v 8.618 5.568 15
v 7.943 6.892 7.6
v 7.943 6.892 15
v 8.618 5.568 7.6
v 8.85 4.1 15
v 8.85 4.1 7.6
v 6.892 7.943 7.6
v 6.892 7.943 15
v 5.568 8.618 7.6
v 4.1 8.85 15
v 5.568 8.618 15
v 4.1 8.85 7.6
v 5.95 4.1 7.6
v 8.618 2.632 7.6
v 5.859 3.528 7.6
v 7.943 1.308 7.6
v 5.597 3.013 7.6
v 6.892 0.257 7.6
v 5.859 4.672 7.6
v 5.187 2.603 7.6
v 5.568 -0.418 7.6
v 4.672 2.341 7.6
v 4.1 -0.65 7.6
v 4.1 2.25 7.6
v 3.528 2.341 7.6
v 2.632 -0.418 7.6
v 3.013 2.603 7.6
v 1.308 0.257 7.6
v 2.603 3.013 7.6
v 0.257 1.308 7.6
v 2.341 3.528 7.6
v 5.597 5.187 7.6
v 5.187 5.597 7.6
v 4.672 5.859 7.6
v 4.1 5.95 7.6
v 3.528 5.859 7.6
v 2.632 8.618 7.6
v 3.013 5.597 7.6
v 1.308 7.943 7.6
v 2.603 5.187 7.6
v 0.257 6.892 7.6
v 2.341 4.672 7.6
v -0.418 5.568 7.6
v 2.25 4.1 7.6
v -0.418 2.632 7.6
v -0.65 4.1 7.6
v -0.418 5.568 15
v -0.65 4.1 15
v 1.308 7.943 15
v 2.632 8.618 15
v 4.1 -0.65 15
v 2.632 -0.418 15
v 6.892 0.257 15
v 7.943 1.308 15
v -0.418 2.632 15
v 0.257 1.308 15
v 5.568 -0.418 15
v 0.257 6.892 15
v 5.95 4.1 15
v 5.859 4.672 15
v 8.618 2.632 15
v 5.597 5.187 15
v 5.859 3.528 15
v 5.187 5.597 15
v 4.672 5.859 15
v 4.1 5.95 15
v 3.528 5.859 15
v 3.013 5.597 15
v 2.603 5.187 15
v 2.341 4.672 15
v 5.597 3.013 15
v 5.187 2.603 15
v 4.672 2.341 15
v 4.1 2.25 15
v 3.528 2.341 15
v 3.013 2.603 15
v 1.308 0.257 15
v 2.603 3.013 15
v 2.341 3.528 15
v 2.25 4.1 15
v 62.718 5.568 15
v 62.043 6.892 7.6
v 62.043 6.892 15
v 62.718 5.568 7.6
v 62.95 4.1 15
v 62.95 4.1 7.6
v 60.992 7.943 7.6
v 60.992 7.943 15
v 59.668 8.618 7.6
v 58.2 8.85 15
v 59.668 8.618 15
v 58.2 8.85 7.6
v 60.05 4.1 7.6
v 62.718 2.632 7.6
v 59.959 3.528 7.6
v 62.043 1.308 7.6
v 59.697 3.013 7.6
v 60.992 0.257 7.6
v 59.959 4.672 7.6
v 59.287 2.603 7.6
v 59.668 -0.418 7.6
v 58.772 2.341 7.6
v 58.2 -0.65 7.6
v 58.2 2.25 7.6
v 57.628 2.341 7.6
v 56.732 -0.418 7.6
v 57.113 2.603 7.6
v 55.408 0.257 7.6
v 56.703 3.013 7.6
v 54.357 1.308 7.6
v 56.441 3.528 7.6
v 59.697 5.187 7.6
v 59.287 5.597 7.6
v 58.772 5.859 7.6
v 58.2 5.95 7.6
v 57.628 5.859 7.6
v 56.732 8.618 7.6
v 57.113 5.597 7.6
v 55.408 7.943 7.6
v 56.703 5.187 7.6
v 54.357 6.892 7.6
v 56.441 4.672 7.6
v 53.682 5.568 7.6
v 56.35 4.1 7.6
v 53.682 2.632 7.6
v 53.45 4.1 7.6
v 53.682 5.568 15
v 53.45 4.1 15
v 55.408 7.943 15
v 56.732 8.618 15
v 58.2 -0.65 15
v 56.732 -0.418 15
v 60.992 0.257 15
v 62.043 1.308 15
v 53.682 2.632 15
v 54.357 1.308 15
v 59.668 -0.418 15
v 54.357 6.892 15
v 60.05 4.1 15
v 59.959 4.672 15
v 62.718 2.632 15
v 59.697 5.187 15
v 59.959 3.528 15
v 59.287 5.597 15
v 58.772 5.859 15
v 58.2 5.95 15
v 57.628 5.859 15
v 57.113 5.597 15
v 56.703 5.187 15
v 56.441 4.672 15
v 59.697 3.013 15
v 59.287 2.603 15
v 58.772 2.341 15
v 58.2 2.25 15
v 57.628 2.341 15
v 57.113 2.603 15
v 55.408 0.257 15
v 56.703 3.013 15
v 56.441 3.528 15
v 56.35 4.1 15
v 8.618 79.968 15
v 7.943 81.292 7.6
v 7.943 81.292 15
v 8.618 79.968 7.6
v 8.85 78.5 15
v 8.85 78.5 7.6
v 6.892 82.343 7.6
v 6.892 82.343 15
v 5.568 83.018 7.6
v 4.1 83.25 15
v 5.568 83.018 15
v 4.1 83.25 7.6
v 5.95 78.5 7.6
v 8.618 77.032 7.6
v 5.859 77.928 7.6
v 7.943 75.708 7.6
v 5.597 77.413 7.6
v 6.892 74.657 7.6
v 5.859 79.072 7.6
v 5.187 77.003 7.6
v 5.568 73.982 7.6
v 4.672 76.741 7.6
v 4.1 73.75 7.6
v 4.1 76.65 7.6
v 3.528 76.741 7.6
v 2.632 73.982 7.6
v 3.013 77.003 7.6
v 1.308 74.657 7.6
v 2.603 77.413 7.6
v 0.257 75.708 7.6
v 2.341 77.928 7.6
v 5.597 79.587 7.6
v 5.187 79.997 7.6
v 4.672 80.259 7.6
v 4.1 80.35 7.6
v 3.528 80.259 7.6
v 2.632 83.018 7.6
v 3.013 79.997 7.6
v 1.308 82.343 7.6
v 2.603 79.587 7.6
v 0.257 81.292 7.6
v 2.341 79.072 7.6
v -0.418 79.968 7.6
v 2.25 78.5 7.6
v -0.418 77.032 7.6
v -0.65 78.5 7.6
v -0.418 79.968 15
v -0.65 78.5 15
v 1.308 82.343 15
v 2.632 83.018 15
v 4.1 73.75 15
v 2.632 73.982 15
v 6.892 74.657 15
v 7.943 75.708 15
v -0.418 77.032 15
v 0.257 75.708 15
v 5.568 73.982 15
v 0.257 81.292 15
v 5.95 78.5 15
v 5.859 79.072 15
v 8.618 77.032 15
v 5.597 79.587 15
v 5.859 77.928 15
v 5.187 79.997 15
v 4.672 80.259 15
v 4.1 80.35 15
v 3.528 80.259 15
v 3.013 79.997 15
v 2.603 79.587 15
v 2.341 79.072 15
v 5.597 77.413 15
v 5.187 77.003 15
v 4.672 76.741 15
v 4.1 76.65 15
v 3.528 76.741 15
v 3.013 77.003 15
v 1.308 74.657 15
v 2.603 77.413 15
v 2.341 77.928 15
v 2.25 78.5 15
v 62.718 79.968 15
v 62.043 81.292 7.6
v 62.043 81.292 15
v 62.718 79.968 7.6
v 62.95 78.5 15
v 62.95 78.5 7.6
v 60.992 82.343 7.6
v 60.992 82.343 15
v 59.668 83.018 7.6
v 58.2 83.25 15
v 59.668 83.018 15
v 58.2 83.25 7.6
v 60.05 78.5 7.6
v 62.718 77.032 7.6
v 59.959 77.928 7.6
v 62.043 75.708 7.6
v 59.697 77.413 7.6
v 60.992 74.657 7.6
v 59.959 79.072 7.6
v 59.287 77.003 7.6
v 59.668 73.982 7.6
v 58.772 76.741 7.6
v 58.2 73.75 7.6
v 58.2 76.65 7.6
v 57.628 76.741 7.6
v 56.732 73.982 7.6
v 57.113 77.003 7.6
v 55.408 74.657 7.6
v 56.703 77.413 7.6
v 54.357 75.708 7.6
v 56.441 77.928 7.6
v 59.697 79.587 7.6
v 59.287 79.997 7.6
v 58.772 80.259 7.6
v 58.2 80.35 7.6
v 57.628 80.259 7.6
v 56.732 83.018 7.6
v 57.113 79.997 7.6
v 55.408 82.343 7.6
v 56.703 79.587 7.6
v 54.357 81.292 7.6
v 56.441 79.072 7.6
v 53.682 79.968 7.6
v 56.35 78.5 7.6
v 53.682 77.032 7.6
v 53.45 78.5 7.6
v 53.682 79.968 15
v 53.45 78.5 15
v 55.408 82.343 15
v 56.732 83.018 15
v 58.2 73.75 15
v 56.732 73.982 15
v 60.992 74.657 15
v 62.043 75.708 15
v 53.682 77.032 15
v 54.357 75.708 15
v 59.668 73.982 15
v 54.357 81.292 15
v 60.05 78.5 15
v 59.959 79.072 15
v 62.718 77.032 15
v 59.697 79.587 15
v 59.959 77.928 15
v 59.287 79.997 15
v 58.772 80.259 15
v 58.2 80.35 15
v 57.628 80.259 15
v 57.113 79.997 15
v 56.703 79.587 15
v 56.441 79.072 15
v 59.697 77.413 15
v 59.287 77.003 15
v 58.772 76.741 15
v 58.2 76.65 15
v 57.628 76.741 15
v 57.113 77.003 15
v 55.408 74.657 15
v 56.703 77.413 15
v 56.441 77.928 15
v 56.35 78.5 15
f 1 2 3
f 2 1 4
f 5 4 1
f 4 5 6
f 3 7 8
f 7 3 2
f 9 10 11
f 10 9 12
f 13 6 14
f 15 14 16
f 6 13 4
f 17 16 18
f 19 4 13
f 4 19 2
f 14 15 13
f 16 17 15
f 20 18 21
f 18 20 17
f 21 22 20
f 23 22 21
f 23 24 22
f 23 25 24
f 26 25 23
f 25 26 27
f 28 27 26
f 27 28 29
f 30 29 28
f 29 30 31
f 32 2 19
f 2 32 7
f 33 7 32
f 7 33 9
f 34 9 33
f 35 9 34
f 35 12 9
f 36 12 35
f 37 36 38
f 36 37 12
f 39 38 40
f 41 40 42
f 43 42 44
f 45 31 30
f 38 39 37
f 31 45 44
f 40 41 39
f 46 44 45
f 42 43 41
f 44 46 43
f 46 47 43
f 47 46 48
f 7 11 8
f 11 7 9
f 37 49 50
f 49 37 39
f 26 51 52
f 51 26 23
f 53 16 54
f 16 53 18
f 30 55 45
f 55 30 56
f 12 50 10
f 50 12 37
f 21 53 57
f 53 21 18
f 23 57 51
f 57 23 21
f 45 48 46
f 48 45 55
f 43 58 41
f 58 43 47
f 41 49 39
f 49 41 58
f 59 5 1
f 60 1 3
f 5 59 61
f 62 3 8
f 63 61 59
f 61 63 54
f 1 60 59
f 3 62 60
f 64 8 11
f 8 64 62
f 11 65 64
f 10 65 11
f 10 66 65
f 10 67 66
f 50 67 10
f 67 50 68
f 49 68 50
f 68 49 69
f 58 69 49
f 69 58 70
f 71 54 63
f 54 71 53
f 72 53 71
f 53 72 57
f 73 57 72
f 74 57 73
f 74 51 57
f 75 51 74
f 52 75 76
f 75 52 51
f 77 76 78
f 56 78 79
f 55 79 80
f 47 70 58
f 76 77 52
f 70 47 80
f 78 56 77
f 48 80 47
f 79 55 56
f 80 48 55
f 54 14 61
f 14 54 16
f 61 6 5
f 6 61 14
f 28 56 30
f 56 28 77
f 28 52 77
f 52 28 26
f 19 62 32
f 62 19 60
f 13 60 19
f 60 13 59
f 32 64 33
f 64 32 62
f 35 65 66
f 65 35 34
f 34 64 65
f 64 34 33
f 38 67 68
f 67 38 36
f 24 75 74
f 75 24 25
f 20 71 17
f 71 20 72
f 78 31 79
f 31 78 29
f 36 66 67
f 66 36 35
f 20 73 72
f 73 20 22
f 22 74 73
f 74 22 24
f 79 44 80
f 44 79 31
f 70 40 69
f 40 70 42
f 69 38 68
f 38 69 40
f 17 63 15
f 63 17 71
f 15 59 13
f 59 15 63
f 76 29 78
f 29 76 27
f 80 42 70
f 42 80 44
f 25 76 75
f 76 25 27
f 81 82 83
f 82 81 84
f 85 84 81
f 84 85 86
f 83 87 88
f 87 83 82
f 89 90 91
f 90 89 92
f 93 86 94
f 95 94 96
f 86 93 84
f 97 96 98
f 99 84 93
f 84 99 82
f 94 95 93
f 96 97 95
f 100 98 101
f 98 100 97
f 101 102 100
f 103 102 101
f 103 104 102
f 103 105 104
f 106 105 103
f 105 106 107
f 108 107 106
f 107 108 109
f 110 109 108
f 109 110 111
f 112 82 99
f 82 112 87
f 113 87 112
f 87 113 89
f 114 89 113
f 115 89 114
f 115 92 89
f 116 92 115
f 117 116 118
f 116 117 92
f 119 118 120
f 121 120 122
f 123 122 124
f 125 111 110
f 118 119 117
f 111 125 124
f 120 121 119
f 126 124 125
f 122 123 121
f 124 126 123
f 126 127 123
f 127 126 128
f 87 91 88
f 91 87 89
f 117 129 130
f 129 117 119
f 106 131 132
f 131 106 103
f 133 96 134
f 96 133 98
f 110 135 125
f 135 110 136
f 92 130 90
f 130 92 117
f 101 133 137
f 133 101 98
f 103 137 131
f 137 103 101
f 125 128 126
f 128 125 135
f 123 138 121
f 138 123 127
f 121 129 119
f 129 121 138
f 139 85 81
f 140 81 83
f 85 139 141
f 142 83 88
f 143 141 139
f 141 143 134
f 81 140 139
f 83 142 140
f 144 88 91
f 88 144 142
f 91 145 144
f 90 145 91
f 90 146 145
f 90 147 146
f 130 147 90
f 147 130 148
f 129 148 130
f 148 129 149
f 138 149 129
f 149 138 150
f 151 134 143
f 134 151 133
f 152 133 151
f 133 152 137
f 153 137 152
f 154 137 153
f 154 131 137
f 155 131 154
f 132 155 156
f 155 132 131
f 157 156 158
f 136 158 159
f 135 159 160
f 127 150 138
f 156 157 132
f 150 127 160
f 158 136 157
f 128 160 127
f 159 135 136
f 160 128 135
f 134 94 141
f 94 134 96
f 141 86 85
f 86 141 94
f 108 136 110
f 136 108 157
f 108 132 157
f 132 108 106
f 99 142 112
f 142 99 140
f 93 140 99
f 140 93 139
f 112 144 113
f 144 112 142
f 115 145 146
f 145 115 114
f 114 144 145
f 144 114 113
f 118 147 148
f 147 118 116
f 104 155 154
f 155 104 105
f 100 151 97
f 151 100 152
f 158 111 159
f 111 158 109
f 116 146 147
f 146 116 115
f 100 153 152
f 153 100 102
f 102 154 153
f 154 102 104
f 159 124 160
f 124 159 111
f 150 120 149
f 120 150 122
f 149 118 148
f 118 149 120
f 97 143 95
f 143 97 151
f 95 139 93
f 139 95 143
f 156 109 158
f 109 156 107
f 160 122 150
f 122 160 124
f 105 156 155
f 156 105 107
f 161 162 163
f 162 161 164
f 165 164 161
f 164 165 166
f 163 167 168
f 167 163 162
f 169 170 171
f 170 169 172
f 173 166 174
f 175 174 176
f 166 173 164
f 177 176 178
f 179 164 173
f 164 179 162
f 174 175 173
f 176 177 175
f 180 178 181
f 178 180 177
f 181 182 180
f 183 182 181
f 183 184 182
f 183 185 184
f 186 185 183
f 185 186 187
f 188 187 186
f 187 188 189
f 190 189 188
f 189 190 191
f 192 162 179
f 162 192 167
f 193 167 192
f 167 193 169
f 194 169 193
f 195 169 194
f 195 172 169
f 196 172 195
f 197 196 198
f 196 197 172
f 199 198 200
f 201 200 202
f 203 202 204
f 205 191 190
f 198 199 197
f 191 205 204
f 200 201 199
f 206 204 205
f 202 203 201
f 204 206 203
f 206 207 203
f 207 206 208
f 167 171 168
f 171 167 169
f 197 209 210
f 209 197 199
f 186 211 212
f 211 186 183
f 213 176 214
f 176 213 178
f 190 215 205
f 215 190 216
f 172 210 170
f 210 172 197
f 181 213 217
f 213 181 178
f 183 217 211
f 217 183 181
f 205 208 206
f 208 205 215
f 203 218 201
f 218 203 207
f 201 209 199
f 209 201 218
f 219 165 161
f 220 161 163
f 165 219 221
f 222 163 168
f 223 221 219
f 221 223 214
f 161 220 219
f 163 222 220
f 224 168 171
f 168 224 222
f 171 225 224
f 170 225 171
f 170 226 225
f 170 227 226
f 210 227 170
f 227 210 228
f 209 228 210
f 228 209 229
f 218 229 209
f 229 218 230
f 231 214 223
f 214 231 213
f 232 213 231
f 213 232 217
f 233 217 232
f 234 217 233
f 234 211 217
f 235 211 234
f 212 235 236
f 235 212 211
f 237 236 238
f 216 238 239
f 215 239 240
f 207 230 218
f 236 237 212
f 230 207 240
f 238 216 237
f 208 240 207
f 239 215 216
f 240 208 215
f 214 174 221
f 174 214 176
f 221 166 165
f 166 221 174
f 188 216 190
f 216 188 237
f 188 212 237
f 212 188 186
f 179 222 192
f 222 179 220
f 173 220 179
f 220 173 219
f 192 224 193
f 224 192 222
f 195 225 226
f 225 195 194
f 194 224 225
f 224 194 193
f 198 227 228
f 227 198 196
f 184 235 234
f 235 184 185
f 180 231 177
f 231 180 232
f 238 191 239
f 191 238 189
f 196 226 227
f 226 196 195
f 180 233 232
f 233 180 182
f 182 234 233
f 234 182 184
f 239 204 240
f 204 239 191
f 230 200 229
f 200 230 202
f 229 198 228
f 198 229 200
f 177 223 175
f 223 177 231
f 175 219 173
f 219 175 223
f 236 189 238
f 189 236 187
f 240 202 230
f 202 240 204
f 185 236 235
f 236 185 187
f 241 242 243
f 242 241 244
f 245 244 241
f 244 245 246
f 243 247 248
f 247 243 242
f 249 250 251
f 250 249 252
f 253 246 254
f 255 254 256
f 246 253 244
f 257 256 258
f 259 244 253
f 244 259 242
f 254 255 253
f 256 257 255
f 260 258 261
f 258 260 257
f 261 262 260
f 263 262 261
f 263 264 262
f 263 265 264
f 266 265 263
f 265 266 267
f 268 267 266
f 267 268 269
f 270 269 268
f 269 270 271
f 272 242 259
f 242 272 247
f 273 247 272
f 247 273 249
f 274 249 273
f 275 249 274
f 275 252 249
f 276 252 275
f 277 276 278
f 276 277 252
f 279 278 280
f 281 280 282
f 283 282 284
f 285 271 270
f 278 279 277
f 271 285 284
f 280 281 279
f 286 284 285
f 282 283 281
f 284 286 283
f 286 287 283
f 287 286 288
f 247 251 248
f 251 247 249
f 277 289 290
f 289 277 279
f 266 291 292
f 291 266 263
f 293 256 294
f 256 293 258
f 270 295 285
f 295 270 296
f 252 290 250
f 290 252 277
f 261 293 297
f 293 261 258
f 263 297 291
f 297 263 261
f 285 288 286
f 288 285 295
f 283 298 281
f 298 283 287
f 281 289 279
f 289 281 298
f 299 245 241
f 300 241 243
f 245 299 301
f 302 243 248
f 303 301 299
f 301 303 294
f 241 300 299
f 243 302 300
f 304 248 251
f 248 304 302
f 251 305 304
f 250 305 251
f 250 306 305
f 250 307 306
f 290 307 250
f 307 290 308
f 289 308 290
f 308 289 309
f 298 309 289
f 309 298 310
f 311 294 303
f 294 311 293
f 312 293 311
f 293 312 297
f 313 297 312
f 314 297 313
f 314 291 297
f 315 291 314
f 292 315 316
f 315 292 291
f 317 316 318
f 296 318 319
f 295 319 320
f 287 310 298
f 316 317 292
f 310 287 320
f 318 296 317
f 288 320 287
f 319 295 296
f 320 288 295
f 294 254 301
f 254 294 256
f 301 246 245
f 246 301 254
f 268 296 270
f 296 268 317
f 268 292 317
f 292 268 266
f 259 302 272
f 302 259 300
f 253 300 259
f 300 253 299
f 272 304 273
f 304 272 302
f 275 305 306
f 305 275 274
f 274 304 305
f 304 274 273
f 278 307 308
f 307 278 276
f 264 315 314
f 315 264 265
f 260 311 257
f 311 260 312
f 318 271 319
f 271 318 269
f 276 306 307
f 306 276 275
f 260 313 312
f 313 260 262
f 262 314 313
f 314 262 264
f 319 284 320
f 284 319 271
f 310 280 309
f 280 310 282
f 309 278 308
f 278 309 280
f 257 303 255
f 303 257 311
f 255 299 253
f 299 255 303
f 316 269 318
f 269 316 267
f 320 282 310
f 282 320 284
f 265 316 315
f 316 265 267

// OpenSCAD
// Designed for the Parallax RFID Reader 28140
// A rather too expensive module

// 62.2 x 82.5 x 5.57 mm
// Use 3mm walls
// 3.5mm screw holes
// 54.5mm bolt center-to-center distance
// 75mm bolt center-to-center distance y
// 1.6mm 

// #6 machine screw holes

width = 62.3;
height = 82.6;
side_space = 1;
board_depth = 1.6;
standoff = 2;
electronics_depth = 4;
electronics_height = 15;
electronics_width = 47;
bolt_diameter = 9.5;
bolt_thickness = 3;
bolt_hole_diameter = 3.7;
plate_thickness = 3;
bolt_length = 18;

// connector hole 2.54 x 10.12
connector_width = 11;
connector_depth = 3;
connector_offset = 8;

wall_thickness = 2.5;

// to prevent rounding problems
del = 0.1;
front_thickness = max(wall_thickness, bolt_thickness + 1);
depth = bolt_length - plate_thickness;
bolt_offset = bolt_hole_diameter / 2 + 2.25;
bolt_hole_locations = [
  [bolt_offset, bolt_offset, 0],
  [width - bolt_offset, bolt_offset, 0],
  [bolt_offset, height - bolt_offset, 0],
  [width - bolt_offset, height - bolt_offset, 0]];

module rfid_reader_enclosure() {

  difference() {
    translate([-wall_thickness - side_space, -wall_thickness - side_space])
      cube([width + 2 * (wall_thickness + side_space), height + 2 * (wall_thickness + side_space), depth]);

    // void for the board and electronics
    difference() {
      translate([-side_space, -side_space, front_thickness])
        cube([2 * side_space + width, 2 * side_space + height, depth - front_thickness + del]);
      // standoffs for the board
      for(location = bolt_hole_locations) {
        translate(location)
          cylinder(d = bolt_diameter, h = front_thickness + standoff);
      }
    }

    // void for the connectors
    translate([connector_offset, -side_space - wall_thickness - del, front_thickness + board_depth + standoff - 0.25])
      cube([connector_width, wall_thickness + 2 * del, connector_depth]);

    // Bolt holes
    for(location = bolt_hole_locations) {
      translate(location)
      translate([0, 0, -del]) {
        cylinder(d = bolt_hole_diameter, h = depth, $fn = 20);
        cylinder(d = bolt_diameter, h = bolt_thickness, $fn = 6);
      }
    }

    // essentially placed manually
    translate([0, 0, -del])
    linear_extrude(height = min(0.5, wall_thickness / 2)) {
      translate([55, electronics_height, 0])
      scale(0.5)
      mirror([1, 0, 0])
      translate([-26, -18, 0])
        import("Hackrobot.dxf");
    }

  }
}

module rfid_spacer() {
  spacer_height = depth - front_thickness - standoff - board_depth;
  difference() {
    cylinder(d = bolt_diameter, h = spacer_height, $fn = 20);
    translate([0, 0, -del])
    cylinder(d = bolt_hole_diameter, h = spacer_height + 2 * del, $fn = 20);
  }
}

*rfid_reader_enclosure();

for(location = bolt_hole_locations) {
  translate([0, 0, front_thickness + standoff + board_depth])
  translate(location)
    rfid_spacer();
}
